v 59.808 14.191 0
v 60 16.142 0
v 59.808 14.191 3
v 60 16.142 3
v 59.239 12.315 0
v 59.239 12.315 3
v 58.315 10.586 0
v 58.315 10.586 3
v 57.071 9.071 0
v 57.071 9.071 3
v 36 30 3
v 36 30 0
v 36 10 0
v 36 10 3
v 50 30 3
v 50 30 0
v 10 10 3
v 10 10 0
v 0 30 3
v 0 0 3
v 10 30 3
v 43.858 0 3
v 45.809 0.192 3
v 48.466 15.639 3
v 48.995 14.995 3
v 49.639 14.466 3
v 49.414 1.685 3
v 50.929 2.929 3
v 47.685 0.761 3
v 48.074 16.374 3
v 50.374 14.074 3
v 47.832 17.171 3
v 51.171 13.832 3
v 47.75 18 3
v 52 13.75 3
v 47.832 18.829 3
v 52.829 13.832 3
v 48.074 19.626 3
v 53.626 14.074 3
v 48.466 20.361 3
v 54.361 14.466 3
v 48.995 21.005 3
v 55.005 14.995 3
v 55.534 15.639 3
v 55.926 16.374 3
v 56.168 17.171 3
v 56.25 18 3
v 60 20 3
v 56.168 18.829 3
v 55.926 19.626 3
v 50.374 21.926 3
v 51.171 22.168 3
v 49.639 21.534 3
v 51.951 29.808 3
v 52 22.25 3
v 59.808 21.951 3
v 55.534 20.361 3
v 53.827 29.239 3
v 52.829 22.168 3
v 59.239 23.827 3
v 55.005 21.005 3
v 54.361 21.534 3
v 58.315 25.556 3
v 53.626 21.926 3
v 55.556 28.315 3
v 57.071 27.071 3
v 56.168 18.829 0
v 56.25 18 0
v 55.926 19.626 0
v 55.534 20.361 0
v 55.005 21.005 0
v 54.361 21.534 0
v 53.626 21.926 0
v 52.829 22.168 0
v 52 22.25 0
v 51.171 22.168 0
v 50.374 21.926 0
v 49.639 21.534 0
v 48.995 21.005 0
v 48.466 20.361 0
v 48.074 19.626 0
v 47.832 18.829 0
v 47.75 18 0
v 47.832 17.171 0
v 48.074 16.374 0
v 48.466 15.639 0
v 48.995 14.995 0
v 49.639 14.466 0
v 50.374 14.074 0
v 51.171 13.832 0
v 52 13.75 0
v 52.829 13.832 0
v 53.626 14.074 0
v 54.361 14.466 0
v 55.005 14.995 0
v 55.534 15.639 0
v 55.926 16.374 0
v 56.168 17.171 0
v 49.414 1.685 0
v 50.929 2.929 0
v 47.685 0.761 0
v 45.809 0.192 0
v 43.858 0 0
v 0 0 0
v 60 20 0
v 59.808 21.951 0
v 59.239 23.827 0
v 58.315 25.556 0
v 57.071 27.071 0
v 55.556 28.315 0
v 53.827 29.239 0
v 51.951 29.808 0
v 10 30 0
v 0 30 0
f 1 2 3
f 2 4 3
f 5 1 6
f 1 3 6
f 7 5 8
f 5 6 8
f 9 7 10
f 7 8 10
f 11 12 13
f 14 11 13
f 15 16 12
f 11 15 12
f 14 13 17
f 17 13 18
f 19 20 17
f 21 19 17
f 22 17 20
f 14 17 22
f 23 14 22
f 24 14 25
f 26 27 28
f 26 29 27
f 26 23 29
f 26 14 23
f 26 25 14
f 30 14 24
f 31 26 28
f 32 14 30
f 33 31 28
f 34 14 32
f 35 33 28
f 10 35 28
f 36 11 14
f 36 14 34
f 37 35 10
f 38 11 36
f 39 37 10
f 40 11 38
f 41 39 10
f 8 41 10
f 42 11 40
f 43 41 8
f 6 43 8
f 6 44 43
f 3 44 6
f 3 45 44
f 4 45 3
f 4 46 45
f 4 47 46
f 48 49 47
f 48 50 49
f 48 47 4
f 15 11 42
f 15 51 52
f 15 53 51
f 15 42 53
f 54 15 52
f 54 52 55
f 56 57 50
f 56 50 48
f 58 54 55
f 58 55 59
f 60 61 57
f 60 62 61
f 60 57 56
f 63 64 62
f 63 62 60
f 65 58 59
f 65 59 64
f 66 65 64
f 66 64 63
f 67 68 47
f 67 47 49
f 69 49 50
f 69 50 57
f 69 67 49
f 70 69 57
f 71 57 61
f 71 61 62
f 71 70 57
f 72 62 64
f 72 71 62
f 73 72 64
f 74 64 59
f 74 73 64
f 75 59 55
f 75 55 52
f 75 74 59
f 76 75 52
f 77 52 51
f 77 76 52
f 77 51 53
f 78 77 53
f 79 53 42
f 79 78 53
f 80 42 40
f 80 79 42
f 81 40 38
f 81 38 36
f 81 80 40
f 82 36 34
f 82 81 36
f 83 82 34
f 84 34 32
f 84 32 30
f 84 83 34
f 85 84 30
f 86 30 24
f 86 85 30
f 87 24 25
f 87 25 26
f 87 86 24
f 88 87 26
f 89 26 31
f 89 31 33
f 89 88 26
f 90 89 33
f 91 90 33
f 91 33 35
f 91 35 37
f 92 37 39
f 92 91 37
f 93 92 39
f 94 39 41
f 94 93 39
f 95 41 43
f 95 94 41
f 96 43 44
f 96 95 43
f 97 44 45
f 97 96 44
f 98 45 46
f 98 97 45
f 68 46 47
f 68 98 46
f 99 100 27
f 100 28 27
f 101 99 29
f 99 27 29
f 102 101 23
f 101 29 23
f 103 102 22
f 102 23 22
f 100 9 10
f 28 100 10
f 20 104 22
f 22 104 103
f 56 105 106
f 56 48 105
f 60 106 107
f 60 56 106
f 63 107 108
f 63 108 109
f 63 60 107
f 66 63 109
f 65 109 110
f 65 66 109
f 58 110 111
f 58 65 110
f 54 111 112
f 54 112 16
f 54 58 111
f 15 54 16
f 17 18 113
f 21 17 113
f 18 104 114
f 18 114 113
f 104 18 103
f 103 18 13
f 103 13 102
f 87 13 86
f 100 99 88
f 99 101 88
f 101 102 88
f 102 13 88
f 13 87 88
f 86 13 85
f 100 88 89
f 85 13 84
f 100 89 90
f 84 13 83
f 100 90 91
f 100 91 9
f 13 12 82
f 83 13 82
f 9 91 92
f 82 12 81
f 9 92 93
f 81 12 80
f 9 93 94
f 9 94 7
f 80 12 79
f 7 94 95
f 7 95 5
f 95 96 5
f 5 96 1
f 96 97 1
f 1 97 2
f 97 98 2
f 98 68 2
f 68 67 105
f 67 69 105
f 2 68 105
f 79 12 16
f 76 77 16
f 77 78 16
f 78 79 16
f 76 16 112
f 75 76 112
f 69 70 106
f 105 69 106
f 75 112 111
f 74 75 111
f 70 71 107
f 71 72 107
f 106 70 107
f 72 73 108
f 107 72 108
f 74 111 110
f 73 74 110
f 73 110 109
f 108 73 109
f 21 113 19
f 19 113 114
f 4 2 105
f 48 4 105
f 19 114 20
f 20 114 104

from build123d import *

# Parameters (mm, degrees)
SKETCH1_R           = 4.25
BOSS_EXTRUDE1_DEPTH = 3
CHAMFER1_SIZE       = 12
FILLET1_R           = 10
FILLET2_R           = 10


with BuildPart() as part:
    # Sketch1 → Boss-Extrude1 (new body)
    with BuildSketch(Plane.XY):
        Polygon((0, 30), (0, 0), (60, 0), (60, 30), (36, 30), (36, 10), (10, 10), (10, 30), align=None)
        with Locations((52, 18)):
            Circle(SKETCH1_R, mode=Mode.SUBTRACT)
    extrude(amount=BOSS_EXTRUDE1_DEPTH)

    # Chamfer1
    chamfer1_edges = [part.edges().sort_by_distance(p)[0] for p in [
        (60, 0, 1.5),
    ]]
    chamfer(chamfer1_edges, length=CHAMFER1_SIZE)

    # Fillet1
    fillet1_edges = [part.edges().sort_by_distance(p)[0] for p in [
        (60, 30, 1.5),
    ]]
    fillet(fillet1_edges, radius=FILLET1_R)

    # Fillet2
    fillet2_edges = [part.edges().sort_by_distance(p)[0] for p in [
        (60, 12, 1.5),
        (48, 0, 1.5),
    ]]
    fillet(fillet2_edges, radius=FILLET2_R)


solid = part.part
